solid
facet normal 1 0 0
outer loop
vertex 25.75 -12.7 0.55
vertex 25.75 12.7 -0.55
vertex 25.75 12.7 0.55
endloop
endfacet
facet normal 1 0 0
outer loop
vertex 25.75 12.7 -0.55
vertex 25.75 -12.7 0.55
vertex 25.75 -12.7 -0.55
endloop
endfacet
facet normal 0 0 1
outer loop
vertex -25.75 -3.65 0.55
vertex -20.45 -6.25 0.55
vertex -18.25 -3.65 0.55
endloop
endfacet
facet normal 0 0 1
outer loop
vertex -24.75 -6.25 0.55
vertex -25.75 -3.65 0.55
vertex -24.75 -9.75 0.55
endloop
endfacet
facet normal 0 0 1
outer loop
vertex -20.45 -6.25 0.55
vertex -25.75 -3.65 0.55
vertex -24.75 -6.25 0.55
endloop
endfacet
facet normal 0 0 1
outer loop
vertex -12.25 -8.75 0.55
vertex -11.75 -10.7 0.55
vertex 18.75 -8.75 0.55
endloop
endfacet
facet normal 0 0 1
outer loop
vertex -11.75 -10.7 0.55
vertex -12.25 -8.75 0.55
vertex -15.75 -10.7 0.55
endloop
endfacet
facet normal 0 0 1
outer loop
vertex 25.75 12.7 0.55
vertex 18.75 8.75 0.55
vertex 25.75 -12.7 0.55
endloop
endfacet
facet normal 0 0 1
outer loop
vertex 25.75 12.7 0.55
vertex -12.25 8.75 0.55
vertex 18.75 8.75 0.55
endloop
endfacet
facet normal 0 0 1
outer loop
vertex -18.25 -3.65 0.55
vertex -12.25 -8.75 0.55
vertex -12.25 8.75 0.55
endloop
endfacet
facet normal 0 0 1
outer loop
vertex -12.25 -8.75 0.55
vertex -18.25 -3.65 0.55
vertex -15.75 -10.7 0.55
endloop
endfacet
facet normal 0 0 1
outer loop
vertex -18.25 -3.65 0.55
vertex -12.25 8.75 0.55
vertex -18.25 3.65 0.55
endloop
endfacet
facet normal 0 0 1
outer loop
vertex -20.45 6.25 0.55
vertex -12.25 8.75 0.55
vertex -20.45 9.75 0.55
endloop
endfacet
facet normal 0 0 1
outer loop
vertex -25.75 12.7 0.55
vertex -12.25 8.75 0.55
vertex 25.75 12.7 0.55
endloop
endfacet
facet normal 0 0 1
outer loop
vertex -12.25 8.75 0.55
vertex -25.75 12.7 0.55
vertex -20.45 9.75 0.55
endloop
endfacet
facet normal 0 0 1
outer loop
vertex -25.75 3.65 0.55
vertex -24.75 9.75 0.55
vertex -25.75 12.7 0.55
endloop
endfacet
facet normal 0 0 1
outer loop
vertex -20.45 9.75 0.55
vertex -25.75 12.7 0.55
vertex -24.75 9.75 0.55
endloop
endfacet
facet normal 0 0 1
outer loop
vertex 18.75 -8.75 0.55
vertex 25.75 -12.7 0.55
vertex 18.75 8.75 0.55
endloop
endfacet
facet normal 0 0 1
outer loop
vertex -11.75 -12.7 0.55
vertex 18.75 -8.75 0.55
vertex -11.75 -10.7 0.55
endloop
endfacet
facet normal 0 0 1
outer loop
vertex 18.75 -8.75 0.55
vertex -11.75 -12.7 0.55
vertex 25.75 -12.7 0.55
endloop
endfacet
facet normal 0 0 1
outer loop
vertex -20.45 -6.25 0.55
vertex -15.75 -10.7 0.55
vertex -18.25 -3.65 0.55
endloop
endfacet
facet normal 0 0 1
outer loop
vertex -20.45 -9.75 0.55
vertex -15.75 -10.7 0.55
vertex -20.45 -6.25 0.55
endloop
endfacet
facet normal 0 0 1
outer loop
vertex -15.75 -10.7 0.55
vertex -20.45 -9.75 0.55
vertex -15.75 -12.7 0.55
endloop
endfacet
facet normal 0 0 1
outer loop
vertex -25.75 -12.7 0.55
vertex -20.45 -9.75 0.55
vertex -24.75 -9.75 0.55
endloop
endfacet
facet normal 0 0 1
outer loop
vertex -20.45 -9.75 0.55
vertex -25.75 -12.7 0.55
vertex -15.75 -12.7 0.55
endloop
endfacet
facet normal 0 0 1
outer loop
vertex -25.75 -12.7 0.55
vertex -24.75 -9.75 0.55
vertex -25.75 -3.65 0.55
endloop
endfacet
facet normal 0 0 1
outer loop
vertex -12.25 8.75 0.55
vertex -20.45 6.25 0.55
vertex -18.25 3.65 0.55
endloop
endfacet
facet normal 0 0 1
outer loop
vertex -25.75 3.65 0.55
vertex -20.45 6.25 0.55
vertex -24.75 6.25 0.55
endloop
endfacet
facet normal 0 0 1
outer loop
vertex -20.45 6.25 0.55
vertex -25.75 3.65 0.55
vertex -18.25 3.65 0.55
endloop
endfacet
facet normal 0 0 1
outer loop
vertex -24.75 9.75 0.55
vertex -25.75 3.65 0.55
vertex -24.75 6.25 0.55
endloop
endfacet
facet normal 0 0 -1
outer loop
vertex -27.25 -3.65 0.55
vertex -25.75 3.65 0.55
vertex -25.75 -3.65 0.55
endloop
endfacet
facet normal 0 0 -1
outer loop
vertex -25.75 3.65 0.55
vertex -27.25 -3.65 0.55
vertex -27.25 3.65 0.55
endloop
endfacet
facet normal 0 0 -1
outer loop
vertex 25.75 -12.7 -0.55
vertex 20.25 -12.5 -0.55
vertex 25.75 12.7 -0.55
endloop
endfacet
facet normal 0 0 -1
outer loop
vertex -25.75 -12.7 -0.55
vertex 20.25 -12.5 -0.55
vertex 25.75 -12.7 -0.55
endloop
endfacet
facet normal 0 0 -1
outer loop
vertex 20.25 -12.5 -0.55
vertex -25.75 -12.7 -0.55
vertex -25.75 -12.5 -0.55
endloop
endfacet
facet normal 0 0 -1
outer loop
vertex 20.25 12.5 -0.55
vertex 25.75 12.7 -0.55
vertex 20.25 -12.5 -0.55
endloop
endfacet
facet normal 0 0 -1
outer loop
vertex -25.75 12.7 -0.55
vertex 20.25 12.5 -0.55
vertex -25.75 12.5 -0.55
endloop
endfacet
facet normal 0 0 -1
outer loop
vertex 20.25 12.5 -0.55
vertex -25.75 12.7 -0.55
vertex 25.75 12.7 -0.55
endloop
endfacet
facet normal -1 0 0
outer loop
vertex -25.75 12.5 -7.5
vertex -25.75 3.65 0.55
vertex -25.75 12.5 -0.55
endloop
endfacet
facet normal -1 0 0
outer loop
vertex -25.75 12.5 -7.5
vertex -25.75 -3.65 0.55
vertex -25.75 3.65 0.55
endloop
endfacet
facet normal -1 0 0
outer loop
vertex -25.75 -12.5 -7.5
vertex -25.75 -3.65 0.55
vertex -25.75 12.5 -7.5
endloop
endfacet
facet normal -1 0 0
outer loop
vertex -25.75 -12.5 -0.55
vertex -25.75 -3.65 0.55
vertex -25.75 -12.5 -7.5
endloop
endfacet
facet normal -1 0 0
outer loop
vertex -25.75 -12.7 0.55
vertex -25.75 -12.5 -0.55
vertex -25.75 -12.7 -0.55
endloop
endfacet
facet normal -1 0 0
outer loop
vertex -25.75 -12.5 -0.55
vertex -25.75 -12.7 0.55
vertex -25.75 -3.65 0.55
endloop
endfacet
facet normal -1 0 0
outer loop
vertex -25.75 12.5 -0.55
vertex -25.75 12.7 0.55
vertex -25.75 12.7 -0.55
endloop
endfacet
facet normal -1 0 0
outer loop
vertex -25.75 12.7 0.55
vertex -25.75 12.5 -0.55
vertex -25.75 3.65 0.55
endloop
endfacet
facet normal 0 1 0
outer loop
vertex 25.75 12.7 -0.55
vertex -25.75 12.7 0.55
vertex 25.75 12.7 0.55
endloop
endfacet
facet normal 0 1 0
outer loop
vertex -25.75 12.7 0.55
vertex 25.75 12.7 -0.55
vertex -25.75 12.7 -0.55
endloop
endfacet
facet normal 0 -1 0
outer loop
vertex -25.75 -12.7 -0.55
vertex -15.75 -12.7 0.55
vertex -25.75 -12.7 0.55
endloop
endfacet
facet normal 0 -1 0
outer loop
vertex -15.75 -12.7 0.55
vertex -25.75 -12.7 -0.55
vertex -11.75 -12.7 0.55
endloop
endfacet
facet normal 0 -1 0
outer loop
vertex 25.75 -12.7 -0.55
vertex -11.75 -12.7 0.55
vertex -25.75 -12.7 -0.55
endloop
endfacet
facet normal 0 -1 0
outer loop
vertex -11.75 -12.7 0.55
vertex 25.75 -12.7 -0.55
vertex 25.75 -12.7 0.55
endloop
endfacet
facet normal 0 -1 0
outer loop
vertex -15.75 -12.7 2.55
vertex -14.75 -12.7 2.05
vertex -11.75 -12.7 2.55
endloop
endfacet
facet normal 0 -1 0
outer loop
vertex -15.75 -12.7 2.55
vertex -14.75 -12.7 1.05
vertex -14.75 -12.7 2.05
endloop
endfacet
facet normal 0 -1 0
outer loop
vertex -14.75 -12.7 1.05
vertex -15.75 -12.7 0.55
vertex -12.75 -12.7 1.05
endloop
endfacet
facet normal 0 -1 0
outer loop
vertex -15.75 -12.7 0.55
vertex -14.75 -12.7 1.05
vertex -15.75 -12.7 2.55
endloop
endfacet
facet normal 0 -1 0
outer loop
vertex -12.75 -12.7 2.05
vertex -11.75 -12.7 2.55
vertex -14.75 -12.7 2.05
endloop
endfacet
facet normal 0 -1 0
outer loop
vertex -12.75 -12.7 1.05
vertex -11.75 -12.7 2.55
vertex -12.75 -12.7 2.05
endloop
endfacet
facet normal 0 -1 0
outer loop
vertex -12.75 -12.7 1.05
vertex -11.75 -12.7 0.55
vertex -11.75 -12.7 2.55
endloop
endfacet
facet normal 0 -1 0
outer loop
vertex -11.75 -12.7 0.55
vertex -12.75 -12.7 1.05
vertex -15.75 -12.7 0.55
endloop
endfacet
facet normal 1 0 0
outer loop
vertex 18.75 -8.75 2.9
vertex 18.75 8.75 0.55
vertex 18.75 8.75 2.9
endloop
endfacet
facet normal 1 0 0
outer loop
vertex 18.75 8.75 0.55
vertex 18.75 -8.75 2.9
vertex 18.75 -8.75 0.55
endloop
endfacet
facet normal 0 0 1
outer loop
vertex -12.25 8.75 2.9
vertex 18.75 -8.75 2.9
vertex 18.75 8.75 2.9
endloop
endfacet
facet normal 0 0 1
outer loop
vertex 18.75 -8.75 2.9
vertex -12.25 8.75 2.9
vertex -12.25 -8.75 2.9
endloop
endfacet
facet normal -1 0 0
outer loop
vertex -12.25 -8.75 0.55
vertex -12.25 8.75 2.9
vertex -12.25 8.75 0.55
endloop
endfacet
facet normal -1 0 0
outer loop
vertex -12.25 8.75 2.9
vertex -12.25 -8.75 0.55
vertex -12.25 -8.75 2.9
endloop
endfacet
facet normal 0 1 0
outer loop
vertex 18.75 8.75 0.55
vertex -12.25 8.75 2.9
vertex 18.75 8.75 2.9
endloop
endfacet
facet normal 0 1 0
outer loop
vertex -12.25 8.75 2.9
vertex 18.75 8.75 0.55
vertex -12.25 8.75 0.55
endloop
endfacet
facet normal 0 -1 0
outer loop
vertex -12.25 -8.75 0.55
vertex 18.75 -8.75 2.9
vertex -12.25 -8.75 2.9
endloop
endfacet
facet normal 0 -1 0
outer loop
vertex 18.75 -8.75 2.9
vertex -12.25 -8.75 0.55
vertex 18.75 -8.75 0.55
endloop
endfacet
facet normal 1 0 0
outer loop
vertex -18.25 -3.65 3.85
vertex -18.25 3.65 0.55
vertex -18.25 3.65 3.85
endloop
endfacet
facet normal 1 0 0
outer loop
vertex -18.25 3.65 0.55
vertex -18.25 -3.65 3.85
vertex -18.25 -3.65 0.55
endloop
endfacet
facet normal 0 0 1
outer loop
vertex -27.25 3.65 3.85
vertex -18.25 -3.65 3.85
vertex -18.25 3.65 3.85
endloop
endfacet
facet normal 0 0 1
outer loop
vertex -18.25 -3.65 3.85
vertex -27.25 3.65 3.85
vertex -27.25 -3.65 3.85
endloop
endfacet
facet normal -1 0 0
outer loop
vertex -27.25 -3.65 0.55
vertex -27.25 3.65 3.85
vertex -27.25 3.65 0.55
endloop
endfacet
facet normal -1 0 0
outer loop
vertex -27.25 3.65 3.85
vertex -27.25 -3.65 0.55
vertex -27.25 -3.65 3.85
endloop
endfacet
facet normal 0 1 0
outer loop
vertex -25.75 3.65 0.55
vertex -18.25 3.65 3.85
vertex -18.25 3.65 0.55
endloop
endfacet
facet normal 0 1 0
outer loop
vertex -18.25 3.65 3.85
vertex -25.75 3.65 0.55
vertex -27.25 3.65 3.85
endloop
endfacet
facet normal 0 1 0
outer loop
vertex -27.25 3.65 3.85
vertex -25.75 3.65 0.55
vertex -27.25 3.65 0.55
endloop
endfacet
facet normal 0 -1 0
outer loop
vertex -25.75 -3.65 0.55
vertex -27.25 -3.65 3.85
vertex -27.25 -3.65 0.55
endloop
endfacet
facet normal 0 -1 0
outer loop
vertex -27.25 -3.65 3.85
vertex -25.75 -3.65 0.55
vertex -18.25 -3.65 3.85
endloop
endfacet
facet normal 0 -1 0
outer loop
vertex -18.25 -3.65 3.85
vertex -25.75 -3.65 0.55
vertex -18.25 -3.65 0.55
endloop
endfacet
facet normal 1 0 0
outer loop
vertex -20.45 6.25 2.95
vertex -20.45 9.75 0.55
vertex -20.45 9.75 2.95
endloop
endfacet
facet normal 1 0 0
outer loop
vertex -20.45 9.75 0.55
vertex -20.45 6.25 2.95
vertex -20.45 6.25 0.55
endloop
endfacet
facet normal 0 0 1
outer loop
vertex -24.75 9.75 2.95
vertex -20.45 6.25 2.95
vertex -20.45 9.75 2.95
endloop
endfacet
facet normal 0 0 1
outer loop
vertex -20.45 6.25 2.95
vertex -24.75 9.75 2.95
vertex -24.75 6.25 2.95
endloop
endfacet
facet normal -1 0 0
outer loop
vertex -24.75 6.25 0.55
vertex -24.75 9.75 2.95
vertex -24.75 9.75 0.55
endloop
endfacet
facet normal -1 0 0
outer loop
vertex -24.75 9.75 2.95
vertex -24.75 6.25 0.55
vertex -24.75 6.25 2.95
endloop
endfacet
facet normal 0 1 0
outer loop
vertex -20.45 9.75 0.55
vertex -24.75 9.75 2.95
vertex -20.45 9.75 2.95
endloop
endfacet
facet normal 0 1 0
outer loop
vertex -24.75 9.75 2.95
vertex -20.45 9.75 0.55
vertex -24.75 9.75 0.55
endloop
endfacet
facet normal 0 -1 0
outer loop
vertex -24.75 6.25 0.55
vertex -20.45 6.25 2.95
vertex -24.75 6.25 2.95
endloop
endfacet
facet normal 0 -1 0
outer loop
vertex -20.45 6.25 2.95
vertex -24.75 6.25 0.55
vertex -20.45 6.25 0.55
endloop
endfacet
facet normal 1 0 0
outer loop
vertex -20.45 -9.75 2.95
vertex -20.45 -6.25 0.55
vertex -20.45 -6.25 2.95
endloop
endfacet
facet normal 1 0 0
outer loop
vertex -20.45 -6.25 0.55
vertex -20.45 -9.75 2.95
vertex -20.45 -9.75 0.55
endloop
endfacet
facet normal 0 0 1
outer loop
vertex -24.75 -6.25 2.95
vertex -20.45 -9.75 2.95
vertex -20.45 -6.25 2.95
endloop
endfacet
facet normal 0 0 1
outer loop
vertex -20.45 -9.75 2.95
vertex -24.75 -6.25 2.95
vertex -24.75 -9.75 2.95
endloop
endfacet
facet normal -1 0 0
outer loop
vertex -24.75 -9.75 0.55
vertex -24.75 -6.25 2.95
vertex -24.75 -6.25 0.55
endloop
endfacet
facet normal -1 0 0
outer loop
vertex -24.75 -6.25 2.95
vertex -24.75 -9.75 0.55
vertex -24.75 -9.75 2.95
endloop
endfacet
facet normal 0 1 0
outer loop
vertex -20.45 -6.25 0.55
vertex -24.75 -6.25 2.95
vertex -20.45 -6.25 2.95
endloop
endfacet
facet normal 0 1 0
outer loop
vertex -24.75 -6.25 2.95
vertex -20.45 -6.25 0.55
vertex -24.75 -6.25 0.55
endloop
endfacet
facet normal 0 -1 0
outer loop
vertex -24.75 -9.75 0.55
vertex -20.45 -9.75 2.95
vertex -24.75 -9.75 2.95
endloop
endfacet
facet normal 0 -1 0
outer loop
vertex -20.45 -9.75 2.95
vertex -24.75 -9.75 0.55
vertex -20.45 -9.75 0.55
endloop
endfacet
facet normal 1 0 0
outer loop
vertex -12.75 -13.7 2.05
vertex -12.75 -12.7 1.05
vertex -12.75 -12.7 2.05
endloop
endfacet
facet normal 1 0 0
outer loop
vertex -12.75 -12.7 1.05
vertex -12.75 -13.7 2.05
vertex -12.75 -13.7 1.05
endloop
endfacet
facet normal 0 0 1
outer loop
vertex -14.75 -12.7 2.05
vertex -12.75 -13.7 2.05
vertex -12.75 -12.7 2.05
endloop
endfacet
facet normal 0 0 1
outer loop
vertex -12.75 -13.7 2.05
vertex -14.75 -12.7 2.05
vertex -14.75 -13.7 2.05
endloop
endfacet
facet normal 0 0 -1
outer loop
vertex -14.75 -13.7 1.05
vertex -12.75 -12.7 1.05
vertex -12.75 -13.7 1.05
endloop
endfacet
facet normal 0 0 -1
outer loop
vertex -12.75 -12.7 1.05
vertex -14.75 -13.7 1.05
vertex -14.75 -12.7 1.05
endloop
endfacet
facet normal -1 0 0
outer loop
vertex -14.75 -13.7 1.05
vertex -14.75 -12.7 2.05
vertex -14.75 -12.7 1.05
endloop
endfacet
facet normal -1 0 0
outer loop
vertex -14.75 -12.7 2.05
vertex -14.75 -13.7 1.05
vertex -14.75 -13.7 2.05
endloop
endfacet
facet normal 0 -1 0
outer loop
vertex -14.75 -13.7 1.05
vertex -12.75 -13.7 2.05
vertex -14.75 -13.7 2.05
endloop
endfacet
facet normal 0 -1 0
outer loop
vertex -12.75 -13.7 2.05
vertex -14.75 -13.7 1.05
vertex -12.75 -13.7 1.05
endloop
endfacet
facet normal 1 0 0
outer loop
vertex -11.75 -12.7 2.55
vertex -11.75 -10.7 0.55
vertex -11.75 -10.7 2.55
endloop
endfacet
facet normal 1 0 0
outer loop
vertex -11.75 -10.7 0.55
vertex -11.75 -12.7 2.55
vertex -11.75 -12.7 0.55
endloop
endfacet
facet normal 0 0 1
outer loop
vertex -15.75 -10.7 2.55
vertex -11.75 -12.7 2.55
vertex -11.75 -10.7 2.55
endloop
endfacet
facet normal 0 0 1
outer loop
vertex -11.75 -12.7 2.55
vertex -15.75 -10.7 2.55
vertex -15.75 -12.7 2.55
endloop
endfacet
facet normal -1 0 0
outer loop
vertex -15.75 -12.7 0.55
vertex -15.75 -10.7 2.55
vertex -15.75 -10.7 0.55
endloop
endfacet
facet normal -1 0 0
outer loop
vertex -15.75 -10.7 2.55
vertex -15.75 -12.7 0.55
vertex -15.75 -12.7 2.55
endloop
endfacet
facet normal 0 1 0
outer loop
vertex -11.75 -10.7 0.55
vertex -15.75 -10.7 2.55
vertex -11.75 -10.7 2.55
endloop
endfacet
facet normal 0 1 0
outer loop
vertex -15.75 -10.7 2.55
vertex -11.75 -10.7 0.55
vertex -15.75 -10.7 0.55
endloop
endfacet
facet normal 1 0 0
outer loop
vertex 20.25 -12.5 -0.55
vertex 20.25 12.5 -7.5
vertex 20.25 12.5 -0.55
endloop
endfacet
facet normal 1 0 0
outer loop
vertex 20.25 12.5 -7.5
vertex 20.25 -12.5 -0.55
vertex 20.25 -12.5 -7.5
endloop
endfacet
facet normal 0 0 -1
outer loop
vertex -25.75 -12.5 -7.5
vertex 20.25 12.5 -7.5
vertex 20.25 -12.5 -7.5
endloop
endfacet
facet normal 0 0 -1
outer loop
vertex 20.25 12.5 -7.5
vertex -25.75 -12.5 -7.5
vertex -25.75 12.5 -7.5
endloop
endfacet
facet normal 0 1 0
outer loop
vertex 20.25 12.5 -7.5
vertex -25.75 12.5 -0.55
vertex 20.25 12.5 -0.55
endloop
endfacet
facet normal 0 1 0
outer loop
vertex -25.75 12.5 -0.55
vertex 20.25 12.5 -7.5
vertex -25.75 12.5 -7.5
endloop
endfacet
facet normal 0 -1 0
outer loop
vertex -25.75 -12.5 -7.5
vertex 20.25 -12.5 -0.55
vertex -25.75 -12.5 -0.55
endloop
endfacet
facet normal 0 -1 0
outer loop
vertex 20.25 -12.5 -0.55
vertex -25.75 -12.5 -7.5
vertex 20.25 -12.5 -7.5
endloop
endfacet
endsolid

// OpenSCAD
module esp32_lilygo_t_display() {
    pcb=[51.5,25.4,1.1];
    disp=[31,17.5,2.4];
    usb=[9,7.3,3.3];    
    bt=[4.3,3.5,2.4];
    rst=[2,2,1];    
    union() {       
      // PCB
      cube(pcb, center=true);           
      // screen        
      translate([(pcb[0]-disp[0])/2-7,0,1.7])
       cube(disp, center=true);           
      // USB
      translate([-(pcb[0]-usb[0])/2-1.5,0,(pcb[2]+usb[2])/2])
        cube(usb, center=true);    
      // buttons
      translate([-(pcb[0]-bt[0])/2+1,8,(pcb[2]+bt[2])/2])        
        cube(bt, center=true);    
      translate([-(pcb[0]-bt[0])/2+1,-8,(pcb[2]+bt[2])/2])        
        cube(bt, center=true);    
      // reset button
      translate([-pcb[0]/2+12,-pcb[1]/2,(pcb[2]+rst[2]+1)/2])
        cube(rst, center=true);    
      translate([-pcb[0]/2+12,-pcb[1]/2+1,pcb[2]/2+1])
        cube([4,2,2], center=true);    
      // safe sapce
      translate([-2.75,0,-4])
        cube([46,25,7], center=true);    
    }
}

color("#30AA30")
rotate([0,0,0])
  esp32_lilygo_t_display();    
